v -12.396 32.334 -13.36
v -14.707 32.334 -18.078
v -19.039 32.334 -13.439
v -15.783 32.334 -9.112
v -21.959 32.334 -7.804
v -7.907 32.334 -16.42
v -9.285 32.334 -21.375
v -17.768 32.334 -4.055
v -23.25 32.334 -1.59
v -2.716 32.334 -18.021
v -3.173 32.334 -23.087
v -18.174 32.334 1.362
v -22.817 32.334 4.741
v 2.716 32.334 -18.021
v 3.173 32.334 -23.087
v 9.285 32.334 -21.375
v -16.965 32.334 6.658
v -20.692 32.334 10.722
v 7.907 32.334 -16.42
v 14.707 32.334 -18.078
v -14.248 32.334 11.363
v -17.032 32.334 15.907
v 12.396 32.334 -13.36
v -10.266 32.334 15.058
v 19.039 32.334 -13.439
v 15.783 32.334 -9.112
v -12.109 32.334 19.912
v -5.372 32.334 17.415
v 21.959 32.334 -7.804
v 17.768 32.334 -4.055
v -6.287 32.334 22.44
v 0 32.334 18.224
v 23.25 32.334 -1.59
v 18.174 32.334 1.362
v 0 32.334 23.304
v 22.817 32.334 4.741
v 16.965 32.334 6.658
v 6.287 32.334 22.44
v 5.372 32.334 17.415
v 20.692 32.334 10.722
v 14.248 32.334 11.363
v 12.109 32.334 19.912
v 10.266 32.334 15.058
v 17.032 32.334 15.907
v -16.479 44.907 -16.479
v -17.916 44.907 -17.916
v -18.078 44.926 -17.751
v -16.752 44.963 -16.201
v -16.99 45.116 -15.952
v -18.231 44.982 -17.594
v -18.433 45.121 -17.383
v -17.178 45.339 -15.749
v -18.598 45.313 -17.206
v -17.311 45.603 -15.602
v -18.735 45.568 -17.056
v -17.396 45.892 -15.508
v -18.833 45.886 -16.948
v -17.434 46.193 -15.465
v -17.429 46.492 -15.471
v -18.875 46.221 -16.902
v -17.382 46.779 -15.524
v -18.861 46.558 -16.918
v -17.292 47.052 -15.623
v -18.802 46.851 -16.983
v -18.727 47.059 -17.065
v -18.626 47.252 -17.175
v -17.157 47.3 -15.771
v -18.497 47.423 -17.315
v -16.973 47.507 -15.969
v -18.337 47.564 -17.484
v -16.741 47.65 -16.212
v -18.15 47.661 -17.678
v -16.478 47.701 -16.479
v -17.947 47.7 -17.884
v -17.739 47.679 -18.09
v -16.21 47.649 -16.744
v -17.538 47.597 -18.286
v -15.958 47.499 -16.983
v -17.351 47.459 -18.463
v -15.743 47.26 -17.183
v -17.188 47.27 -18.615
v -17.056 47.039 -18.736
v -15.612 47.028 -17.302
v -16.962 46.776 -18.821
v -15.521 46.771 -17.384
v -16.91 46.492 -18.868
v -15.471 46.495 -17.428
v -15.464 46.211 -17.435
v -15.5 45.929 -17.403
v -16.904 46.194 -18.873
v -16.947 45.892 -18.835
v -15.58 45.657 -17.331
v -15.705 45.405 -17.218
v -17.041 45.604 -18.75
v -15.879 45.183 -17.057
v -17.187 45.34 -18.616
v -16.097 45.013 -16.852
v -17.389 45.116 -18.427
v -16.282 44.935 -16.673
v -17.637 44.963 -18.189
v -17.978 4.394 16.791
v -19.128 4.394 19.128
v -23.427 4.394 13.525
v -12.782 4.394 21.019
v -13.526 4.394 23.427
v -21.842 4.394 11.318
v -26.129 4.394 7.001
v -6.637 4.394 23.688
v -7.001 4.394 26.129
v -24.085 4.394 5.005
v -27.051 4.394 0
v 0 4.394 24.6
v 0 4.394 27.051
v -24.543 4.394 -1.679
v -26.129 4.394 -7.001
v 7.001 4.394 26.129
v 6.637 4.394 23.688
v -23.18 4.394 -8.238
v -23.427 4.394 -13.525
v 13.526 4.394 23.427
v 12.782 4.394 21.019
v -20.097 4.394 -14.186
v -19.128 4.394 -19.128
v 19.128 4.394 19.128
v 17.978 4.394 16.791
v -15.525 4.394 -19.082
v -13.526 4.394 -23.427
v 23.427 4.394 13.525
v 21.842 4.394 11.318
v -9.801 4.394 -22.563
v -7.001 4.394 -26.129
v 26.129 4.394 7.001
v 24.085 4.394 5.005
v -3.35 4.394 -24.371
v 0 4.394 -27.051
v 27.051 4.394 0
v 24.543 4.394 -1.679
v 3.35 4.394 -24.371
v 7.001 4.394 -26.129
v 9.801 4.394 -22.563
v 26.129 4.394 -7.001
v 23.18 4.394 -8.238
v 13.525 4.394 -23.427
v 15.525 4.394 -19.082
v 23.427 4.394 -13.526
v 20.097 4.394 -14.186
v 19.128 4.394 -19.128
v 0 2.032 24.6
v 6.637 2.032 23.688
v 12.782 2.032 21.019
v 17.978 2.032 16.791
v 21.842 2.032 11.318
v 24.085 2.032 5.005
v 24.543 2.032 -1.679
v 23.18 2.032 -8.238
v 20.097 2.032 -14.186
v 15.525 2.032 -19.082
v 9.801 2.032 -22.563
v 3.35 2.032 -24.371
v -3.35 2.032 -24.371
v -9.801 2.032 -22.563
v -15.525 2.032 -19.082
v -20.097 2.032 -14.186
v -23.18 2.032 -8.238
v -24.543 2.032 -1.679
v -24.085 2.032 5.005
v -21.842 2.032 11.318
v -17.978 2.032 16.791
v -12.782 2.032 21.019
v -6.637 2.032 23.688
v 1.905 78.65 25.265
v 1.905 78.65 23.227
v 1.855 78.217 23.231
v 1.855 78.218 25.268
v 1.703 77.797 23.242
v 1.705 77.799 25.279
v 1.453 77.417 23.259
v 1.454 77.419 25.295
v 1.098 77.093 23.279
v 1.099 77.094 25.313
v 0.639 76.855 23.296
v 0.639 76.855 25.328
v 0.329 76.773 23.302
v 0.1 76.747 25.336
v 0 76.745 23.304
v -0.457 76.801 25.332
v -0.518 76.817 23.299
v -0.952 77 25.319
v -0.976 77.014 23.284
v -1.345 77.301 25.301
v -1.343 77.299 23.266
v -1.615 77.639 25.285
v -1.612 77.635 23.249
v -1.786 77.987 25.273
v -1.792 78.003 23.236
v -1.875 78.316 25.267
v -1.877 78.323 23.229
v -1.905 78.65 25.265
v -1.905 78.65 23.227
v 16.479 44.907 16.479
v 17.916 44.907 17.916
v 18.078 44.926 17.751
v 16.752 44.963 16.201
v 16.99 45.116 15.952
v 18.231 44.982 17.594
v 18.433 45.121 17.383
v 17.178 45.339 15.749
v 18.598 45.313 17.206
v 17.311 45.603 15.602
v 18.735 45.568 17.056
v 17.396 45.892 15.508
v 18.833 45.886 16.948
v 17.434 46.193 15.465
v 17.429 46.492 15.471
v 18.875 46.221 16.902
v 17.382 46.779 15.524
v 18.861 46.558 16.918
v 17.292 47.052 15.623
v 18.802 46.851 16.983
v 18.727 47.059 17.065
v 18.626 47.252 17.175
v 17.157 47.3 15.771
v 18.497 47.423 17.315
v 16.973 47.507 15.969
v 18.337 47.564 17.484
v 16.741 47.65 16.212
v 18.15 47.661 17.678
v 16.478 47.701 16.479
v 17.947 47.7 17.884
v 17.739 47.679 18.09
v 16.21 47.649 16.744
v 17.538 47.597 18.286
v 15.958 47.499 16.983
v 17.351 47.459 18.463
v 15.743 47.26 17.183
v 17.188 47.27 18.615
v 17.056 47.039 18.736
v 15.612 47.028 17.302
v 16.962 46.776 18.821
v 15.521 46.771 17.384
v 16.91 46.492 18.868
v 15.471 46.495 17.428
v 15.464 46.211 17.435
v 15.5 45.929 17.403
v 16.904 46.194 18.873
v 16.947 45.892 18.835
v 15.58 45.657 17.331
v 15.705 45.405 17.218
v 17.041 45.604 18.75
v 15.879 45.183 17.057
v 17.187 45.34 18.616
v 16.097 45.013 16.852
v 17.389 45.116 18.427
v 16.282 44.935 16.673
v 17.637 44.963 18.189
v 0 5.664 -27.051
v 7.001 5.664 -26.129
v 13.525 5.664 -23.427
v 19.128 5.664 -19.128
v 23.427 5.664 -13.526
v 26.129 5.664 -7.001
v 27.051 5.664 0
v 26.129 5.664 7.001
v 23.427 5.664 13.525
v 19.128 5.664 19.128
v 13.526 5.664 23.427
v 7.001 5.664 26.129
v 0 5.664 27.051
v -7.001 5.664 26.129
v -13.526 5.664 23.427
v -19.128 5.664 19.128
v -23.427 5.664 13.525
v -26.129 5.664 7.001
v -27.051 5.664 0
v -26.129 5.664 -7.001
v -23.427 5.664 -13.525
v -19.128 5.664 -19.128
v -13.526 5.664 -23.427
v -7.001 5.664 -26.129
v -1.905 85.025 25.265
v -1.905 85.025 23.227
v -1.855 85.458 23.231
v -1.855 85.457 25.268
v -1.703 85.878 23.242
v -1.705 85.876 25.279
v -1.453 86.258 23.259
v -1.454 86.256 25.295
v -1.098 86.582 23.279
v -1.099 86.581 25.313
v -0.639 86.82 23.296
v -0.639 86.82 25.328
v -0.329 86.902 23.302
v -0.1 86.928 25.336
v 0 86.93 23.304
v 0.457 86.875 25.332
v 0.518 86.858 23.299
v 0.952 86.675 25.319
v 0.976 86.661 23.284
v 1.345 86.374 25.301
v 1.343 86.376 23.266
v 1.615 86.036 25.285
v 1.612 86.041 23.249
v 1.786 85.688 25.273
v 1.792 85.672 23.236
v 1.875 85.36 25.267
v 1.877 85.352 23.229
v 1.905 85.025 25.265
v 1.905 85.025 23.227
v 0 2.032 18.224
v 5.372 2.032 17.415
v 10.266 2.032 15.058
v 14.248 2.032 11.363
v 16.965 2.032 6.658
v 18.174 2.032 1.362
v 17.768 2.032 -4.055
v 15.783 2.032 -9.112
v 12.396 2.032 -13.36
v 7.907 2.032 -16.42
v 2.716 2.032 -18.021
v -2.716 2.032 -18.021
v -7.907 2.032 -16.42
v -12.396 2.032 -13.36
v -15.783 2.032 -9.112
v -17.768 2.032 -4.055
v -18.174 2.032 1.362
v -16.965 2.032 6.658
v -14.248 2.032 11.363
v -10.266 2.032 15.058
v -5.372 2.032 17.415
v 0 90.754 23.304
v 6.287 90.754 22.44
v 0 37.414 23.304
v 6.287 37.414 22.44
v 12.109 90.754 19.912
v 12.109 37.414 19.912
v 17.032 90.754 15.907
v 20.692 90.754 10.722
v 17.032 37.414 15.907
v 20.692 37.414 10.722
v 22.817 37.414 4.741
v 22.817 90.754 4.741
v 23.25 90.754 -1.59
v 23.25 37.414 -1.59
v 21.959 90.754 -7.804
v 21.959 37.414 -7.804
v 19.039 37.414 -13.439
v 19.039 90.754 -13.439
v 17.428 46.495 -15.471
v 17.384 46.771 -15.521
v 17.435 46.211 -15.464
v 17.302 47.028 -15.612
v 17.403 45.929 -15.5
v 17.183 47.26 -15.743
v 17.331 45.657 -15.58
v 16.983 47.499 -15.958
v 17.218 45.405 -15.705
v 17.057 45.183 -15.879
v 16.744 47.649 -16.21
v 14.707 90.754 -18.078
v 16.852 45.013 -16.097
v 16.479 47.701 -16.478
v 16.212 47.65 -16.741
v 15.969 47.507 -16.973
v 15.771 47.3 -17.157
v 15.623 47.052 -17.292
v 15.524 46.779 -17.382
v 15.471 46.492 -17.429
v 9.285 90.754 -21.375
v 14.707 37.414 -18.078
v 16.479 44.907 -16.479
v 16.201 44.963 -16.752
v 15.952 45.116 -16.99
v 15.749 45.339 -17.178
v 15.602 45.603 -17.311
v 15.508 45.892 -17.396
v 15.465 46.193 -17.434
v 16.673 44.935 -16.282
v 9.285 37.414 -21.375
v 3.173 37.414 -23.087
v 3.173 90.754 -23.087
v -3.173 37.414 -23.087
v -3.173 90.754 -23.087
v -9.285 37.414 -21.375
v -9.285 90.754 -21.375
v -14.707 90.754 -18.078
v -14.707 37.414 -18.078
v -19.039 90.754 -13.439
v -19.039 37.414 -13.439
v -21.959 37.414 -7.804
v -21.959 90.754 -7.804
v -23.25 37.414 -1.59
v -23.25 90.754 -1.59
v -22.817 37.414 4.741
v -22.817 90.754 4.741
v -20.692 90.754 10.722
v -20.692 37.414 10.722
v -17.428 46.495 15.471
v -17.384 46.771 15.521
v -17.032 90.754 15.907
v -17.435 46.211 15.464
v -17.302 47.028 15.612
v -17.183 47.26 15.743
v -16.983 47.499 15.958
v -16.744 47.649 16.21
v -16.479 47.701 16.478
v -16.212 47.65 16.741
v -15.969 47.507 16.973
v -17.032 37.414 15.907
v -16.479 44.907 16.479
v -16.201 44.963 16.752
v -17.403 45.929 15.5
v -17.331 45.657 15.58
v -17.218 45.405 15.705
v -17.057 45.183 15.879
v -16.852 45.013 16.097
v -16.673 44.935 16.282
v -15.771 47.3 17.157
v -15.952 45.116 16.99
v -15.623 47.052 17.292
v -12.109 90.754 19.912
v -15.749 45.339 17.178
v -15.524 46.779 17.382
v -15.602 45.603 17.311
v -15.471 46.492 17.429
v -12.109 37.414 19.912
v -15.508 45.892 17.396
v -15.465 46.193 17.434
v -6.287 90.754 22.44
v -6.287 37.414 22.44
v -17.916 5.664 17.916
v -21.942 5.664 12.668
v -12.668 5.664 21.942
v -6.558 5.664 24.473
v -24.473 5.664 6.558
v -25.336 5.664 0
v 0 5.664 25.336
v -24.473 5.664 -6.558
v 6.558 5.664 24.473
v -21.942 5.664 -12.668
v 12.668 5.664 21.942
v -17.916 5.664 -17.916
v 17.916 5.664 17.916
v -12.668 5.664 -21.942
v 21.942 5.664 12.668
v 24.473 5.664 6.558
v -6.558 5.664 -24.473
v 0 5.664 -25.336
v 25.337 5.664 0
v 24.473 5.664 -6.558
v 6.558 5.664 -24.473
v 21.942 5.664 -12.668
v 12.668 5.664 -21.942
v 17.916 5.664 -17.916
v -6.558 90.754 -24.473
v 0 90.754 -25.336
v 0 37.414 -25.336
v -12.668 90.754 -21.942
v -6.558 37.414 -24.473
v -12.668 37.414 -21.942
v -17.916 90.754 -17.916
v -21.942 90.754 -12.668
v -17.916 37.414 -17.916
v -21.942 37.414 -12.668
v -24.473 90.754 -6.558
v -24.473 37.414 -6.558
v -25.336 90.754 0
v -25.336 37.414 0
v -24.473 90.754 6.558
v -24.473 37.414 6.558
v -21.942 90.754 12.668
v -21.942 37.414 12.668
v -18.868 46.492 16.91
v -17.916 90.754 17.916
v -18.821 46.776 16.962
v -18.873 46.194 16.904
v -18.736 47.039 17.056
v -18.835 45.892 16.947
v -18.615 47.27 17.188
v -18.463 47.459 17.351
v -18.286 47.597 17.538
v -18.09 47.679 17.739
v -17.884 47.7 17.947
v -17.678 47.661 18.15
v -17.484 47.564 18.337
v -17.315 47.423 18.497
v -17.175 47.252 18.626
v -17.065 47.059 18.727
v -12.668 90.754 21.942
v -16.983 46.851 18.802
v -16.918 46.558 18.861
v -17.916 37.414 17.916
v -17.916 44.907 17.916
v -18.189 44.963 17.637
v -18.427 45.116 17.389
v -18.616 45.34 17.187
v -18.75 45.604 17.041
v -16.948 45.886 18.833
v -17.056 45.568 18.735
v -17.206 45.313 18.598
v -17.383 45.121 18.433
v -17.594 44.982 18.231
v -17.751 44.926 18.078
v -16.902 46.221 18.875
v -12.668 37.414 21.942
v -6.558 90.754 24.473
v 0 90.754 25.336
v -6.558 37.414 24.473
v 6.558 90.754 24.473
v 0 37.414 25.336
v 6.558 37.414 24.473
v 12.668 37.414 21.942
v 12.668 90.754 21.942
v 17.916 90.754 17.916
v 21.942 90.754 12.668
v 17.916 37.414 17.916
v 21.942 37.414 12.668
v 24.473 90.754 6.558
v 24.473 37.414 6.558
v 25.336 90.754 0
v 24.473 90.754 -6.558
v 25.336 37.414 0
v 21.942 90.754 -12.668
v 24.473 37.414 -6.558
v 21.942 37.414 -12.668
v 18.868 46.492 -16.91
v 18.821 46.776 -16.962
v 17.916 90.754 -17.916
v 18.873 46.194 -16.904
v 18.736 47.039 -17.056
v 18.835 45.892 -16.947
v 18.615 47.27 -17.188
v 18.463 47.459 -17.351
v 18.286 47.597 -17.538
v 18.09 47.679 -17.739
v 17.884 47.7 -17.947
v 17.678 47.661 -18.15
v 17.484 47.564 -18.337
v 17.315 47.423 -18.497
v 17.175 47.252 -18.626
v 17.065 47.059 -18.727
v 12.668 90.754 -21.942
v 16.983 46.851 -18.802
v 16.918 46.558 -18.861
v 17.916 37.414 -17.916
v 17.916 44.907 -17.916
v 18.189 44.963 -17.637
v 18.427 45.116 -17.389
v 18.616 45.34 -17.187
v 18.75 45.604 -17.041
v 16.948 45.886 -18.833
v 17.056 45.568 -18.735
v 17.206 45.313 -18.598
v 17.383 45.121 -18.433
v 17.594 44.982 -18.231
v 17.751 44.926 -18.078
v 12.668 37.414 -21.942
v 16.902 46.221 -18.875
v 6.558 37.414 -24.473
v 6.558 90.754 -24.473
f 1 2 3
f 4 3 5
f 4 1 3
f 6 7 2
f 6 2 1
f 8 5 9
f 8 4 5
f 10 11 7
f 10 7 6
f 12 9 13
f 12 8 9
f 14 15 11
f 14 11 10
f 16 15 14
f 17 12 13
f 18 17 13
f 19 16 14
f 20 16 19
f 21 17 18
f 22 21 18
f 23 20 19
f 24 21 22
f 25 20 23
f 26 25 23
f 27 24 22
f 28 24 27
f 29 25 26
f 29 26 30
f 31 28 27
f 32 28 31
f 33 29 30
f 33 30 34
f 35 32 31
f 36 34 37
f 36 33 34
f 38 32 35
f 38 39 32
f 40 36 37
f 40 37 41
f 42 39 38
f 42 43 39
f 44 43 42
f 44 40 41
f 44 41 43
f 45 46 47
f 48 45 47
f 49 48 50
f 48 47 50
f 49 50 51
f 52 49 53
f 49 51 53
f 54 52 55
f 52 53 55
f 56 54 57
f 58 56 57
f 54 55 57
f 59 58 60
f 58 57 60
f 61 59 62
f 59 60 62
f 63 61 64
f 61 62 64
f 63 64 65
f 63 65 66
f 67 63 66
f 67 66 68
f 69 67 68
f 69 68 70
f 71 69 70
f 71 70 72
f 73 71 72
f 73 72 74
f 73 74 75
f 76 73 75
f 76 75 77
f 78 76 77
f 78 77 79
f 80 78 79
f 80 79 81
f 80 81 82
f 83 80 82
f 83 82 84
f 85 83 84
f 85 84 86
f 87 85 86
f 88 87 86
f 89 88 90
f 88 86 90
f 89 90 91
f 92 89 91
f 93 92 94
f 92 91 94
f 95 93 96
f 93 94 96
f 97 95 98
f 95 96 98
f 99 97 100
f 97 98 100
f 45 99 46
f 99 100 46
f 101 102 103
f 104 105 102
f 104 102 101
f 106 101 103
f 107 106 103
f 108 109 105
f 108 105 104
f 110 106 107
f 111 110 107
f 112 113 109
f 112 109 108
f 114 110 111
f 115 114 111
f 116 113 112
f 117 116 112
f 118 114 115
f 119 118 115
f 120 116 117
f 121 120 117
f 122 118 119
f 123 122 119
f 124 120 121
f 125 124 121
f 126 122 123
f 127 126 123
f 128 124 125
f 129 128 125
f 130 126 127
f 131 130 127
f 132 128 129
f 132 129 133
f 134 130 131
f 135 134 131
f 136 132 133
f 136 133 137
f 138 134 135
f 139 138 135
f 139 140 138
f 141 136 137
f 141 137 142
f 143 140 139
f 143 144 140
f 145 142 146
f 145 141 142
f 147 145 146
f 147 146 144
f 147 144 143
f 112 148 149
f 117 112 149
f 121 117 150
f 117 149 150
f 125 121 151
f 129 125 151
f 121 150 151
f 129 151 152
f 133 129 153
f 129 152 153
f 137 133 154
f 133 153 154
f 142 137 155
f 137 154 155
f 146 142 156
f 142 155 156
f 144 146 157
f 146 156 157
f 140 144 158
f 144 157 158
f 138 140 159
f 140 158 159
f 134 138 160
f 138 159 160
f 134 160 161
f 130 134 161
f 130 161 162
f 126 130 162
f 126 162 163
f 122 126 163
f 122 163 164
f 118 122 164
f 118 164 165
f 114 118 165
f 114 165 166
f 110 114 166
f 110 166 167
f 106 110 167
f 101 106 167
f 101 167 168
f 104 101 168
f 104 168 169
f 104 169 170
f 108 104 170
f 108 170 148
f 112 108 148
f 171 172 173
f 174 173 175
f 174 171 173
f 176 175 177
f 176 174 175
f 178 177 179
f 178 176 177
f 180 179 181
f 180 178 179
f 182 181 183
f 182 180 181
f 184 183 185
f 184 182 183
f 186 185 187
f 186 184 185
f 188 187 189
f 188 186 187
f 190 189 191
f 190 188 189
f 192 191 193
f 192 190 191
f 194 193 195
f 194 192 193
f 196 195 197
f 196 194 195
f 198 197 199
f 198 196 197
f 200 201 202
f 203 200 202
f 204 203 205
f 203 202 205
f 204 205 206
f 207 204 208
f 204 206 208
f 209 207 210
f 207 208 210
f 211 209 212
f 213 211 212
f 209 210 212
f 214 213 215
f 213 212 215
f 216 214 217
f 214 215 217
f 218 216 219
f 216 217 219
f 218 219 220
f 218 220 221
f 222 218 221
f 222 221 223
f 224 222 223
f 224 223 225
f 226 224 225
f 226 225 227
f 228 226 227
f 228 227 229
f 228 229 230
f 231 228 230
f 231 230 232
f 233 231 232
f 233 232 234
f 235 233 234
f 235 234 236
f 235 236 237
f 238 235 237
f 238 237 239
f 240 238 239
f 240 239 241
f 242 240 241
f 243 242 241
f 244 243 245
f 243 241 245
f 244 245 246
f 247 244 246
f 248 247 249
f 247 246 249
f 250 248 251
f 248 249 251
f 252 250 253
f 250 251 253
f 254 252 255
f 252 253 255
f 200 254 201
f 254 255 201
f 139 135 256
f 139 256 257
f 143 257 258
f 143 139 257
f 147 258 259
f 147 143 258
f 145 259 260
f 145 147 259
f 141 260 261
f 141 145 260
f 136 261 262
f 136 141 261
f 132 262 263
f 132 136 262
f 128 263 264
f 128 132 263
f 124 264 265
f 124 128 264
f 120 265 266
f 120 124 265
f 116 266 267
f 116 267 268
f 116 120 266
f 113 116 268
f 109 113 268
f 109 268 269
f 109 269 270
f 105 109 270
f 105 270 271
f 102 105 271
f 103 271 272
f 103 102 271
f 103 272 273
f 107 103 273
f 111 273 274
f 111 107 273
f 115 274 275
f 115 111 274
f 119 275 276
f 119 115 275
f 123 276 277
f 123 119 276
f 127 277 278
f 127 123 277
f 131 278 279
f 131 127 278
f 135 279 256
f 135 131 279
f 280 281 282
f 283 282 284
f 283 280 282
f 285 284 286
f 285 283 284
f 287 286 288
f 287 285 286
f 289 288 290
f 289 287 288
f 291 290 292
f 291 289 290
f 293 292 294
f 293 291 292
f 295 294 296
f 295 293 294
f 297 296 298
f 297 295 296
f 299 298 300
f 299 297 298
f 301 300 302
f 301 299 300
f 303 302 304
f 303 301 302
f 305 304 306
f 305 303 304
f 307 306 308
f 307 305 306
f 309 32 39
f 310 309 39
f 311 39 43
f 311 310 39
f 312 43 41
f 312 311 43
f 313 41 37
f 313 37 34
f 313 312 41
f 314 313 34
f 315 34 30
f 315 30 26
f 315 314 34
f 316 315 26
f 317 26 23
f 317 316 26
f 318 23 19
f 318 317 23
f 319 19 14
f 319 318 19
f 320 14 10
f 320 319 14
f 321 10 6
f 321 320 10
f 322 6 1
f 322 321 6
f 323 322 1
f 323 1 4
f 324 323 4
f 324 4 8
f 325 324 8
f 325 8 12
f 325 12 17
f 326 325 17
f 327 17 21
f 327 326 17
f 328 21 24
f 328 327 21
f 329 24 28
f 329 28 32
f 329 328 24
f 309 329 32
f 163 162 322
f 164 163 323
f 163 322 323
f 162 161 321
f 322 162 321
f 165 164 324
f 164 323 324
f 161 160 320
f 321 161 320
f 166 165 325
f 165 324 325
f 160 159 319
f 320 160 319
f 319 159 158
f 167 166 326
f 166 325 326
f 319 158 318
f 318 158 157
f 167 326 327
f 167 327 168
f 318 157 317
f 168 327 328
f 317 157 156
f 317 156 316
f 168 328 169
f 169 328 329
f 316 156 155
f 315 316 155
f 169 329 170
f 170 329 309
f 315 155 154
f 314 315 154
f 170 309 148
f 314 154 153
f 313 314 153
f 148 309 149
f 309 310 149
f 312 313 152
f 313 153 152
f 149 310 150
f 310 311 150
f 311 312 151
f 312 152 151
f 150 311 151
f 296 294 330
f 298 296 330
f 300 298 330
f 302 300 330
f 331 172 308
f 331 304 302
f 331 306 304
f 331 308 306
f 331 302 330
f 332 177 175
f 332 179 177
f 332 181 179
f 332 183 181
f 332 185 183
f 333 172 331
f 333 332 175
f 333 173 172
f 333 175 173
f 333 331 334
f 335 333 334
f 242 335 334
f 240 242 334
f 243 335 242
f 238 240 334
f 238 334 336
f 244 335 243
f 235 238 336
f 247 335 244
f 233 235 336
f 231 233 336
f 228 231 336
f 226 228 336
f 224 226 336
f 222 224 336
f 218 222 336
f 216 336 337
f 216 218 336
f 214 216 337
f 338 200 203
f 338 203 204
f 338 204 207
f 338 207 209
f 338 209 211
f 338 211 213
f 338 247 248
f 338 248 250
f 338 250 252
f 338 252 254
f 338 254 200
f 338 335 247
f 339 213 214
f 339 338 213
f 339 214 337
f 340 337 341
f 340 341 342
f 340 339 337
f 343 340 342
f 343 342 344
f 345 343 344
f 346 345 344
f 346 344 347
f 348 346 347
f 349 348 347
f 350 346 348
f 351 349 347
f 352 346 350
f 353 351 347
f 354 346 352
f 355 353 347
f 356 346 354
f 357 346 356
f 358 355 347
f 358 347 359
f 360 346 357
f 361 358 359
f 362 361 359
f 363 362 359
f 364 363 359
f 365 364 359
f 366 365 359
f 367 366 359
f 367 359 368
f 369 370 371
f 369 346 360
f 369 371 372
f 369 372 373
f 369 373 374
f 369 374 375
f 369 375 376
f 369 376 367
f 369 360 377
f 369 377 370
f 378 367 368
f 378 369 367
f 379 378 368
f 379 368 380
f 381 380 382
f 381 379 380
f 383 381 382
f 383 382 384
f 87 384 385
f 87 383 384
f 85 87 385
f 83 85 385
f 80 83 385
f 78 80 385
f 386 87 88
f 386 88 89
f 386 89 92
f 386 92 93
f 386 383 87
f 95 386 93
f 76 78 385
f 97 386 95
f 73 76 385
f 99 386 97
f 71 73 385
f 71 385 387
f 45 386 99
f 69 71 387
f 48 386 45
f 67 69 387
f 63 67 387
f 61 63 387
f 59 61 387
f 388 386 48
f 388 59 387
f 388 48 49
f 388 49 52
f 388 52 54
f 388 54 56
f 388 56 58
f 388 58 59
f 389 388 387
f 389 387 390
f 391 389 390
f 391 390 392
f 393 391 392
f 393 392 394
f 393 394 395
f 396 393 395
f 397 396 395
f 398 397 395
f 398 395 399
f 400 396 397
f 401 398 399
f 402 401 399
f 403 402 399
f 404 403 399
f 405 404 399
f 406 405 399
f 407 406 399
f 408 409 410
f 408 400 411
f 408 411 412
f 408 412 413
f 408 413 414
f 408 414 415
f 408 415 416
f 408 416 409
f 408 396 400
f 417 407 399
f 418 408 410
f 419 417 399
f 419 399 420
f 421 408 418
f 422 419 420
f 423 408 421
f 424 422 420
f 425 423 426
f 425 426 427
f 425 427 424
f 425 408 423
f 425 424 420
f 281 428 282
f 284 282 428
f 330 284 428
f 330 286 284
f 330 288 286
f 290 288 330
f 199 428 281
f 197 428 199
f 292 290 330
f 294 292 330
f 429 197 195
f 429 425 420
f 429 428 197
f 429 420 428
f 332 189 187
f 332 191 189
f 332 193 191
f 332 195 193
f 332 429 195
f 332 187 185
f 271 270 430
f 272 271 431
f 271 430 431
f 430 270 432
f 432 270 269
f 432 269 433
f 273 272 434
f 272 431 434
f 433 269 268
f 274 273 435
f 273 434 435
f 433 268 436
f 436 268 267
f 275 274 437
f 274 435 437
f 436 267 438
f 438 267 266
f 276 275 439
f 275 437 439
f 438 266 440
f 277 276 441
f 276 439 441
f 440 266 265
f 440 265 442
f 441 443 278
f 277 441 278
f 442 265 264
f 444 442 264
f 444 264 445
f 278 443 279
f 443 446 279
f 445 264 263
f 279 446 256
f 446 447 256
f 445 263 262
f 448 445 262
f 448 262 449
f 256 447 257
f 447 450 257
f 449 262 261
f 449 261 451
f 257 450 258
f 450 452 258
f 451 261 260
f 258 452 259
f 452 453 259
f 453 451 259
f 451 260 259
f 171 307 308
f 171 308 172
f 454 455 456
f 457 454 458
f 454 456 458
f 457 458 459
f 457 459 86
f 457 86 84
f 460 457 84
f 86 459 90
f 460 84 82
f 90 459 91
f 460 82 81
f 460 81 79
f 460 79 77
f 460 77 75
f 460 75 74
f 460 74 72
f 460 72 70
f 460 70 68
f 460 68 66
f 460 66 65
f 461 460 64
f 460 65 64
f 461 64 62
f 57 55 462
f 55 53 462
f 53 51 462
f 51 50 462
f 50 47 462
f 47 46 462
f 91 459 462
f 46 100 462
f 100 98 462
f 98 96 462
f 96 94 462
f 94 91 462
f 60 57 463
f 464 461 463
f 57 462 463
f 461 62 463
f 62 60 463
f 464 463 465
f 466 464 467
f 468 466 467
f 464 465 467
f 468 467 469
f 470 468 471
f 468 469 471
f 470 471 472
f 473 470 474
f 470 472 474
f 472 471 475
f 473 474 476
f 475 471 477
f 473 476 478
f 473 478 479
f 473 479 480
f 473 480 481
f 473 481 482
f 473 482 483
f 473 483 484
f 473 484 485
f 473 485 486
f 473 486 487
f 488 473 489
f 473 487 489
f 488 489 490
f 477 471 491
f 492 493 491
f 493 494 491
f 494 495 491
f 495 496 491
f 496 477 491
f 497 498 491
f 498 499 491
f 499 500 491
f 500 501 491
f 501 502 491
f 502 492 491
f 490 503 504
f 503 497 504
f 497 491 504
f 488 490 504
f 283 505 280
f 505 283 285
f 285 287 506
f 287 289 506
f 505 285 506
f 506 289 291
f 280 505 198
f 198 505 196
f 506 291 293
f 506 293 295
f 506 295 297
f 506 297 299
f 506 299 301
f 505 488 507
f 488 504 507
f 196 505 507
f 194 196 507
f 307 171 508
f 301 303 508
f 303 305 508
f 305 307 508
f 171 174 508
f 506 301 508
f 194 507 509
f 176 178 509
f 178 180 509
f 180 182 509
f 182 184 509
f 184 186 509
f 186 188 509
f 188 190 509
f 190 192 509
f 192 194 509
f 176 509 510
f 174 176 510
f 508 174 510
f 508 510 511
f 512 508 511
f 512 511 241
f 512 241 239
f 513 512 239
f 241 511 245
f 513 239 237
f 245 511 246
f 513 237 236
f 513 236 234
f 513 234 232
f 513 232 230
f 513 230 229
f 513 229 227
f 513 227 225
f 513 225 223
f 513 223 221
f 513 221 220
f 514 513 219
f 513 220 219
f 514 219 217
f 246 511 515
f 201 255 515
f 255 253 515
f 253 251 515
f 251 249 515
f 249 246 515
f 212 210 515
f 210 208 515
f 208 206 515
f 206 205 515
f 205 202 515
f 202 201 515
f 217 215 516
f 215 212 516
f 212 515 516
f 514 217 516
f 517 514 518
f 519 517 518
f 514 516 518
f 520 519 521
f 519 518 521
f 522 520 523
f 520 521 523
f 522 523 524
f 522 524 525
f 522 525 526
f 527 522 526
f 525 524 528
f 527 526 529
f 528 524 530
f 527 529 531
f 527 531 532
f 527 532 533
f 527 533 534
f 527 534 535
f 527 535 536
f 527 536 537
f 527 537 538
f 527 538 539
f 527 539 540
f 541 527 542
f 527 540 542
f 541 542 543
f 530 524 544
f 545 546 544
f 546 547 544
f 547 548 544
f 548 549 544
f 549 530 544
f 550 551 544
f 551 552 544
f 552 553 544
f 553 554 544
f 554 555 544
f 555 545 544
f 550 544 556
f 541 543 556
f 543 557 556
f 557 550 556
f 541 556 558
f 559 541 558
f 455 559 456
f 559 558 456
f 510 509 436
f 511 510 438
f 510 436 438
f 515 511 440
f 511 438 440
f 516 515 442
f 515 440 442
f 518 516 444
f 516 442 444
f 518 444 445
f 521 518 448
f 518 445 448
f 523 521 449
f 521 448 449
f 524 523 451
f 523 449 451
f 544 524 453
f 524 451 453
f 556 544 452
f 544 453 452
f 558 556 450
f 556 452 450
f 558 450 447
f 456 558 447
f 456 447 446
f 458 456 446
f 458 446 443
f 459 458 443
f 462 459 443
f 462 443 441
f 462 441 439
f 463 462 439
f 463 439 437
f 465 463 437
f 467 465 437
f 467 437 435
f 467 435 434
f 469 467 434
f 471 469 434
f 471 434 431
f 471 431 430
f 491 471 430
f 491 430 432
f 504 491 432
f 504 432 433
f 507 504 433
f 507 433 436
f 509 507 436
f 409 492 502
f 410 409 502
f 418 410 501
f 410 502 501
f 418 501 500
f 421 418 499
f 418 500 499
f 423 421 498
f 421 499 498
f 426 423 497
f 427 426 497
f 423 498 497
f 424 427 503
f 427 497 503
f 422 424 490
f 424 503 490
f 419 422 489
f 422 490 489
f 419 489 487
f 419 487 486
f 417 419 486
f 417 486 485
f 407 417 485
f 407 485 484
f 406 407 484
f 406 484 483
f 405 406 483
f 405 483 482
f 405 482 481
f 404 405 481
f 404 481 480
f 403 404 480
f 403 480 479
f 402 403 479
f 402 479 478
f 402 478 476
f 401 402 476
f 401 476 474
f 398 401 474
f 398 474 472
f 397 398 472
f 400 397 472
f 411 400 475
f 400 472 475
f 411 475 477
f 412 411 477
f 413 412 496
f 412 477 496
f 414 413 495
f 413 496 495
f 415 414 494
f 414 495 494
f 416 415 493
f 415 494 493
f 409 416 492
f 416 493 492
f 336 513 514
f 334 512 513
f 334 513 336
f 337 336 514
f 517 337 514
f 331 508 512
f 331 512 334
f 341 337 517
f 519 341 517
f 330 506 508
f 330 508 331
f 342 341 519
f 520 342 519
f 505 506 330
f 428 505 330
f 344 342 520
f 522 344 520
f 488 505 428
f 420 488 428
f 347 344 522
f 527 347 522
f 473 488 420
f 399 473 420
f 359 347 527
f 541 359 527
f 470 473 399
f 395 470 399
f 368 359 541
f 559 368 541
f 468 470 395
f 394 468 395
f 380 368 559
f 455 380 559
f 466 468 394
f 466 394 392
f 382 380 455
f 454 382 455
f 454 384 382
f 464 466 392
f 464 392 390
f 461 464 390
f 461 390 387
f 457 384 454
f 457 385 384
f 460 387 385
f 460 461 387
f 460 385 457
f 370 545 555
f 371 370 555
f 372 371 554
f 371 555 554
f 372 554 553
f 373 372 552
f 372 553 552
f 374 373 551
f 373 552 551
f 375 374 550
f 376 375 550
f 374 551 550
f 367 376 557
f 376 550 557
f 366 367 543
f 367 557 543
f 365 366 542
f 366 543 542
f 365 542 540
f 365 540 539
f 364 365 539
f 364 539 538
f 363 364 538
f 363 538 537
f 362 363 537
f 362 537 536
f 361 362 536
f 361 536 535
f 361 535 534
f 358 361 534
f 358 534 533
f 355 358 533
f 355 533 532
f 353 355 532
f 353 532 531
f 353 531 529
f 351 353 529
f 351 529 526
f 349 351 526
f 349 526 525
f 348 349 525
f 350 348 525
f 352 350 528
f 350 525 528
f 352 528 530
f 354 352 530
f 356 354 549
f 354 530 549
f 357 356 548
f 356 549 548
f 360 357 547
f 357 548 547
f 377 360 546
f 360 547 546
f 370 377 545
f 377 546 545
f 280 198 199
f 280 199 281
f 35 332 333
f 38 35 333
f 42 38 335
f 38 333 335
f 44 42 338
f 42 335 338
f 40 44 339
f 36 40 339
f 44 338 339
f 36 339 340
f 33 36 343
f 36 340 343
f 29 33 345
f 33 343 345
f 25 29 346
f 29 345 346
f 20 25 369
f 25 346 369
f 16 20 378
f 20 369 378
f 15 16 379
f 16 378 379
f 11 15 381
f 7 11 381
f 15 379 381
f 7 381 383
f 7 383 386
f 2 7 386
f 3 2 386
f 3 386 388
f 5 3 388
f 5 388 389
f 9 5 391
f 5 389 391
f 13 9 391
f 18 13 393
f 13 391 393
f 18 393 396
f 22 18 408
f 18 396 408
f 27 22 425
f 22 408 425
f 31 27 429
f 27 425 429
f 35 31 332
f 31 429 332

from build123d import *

# Parameters (mm, degrees)
SKETCH1_R                       = 24.5999
SKETCH1_R_2                     = 18.2245
BOSS_EXTRUDE1_DEPTH             = 4.3942
SKETCH2_R                       = 25.3365
SKETCH2_R_2                     = 18.2245
BOSS_EXTRUDE2_DEPTH             = 33.02
SKETCH15_R                      = 27.051
SKETCH15_R_2                    = 25.3365
BOSS_EXTRUDE3_DEPTH             = 1.27
SKETCH18_R                      = 25.3365
SKETCH18_R_2                    = 23.3045
BOSS_EXTRUDE5_DEPTH             = 53.34
CUT_EXTRUDE2_DEPTH              = 10.16
F_35_0_11_DIAMETER_HOLE1_REACH  = 112.817
F_35_0_11_DIAMETER_HOLE1_BORE_R = 1.397
CIRPATTERN1_COUNT               = 4
MOVE_FACE1_BY                   = 2.032
MOVE_FACE2_BY                   = 5.08


with BuildPart() as part:
    # Sketch1 → Boss-Extrude1 (new body)
    with BuildSketch(Plane(origin=(0, 0, 0), x_dir=(1, 0, 0), z_dir=(0, 1, 0))):
        with Locations(Location((0, 0, 0), (0, 0, 270))):
            Circle(SKETCH1_R)
        with Locations(Location((0, 0, 0), (0, 0, 270))):
            Circle(SKETCH1_R_2, mode=Mode.SUBTRACT)
    extrude(amount=BOSS_EXTRUDE1_DEPTH)

    # Sketch2 → Boss-Extrude2 (add)
    with BuildSketch(Plane(origin=(0, 4.3942, 0), x_dir=(1, 0, 0), z_dir=(0, 1, 0))):
        with Locations(Location((0, 0, 0), (0, 0, 270))):
            Circle(SKETCH2_R)
        with Locations(Location((0, 0, 0), (0, 0, 270))):
            Circle(SKETCH2_R_2, mode=Mode.SUBTRACT)
    extrude(amount=BOSS_EXTRUDE2_DEPTH)

    # Sketch15 → Boss-Extrude3 (add)
    with BuildSketch(Plane.XZ.offset(-4.3942)):
        with Locations(Location((0, 0, 0), (0, 0, 270))):
            Circle(SKETCH15_R)
        with Locations(Location((0, 0, 0), (0, 0, 270))):
            Circle(SKETCH15_R_2, mode=Mode.SUBTRACT)
    extrude(amount=-BOSS_EXTRUDE3_DEPTH)

    # Sketch18 → Boss-Extrude5 (add)
    with BuildSketch(Plane(origin=(0, 37.4142, 0), x_dir=(1, 0, 0), z_dir=(0, 1, 0))):
        with Locations(Location((0, 0, 0), (0, 0, 90))):
            Circle(SKETCH18_R)
        with Locations(Location((0, 0, 0), (0, 0, 270))):
            Circle(SKETCH18_R_2, mode=Mode.SUBTRACT)
    extrude(amount=BOSS_EXTRUDE5_DEPTH)

    # Sketch19 → Cut-Extrude2 (cut)
    with BuildSketch(Plane.XY.offset(25.3365)):
        with BuildLine():
            Line((1.905, 85.025248354), (1.905, 78.649848354))
            ThreePointArc((1.905, 78.649848354), (0, 76.744848354), (-1.905, 78.649848354))
            Line((-1.905, 78.649848354), (-1.905, 85.025248354))
            ThreePointArc((-1.905, 85.025248354), (0, 86.930248354), (1.905, 85.025248354))
        make_face()
    extrude(amount=-CUT_EXTRUDE2_DEPTH, mode=Mode.SUBTRACT)

    # #35 (0.11) Diameter Hole1 bore → #35 (0.11) Diameter Hole1 (cut, up to next)
    with BuildSketch(Plane(origin=(-17.915610962, 0, 17.915610962), x_dir=(0, -1, 0), z_dir=(-0.7071067811865488, 0, 0.7071067811865464)), mode=Mode.PRIVATE) as f_35_0_11_diameter_hole1_sk1:
        with Locations((-46.3042, 0)):
            Circle(F_35_0_11_DIAMETER_HOLE1_BORE_R)
    f_35_0_11_diameter_hole1_tool1 = extrude(f_35_0_11_diameter_hole1_sk1.sketch, amount=-F_35_0_11_DIAMETER_HOLE1_REACH, mode=Mode.PRIVATE) & part.part
    f_35_0_11_diameter_hole1 = f_35_0_11_diameter_hole1_tool1.solids().sort_by_distance((-17.915611, 46.3042, 17.915611))[0]
    add(f_35_0_11_diameter_hole1, mode=Mode.SUBTRACT)

    # CirPattern1: #35 (0.11) Diameter Hole1 ×4 about axis
    cirpattern1_axis = Axis((0, 37.4142, 0), (0, -1, 0))
    for i in range(1, CIRPATTERN1_COUNT):
        add(f_35_0_11_diameter_hole1.rotate(cirpattern1_axis, i * 360 / CIRPATTERN1_COUNT), mode=Mode.SUBTRACT)

    # Move Face1: a face moved inward by 2.032
    extrude(part.faces().sort_by_distance((0, 0, 19.67992))[0], amount=MOVE_FACE1_BY, dir=(0, 1, 0), mode=Mode.SUBTRACT)

    # Move Face2: a face moved inward by 5.08
    extrude(part.faces().sort_by_distance((0, 37.4142, 18.6436))[0], amount=MOVE_FACE2_BY, dir=(0, -1, 0), mode=Mode.SUBTRACT)


solid = part.part
